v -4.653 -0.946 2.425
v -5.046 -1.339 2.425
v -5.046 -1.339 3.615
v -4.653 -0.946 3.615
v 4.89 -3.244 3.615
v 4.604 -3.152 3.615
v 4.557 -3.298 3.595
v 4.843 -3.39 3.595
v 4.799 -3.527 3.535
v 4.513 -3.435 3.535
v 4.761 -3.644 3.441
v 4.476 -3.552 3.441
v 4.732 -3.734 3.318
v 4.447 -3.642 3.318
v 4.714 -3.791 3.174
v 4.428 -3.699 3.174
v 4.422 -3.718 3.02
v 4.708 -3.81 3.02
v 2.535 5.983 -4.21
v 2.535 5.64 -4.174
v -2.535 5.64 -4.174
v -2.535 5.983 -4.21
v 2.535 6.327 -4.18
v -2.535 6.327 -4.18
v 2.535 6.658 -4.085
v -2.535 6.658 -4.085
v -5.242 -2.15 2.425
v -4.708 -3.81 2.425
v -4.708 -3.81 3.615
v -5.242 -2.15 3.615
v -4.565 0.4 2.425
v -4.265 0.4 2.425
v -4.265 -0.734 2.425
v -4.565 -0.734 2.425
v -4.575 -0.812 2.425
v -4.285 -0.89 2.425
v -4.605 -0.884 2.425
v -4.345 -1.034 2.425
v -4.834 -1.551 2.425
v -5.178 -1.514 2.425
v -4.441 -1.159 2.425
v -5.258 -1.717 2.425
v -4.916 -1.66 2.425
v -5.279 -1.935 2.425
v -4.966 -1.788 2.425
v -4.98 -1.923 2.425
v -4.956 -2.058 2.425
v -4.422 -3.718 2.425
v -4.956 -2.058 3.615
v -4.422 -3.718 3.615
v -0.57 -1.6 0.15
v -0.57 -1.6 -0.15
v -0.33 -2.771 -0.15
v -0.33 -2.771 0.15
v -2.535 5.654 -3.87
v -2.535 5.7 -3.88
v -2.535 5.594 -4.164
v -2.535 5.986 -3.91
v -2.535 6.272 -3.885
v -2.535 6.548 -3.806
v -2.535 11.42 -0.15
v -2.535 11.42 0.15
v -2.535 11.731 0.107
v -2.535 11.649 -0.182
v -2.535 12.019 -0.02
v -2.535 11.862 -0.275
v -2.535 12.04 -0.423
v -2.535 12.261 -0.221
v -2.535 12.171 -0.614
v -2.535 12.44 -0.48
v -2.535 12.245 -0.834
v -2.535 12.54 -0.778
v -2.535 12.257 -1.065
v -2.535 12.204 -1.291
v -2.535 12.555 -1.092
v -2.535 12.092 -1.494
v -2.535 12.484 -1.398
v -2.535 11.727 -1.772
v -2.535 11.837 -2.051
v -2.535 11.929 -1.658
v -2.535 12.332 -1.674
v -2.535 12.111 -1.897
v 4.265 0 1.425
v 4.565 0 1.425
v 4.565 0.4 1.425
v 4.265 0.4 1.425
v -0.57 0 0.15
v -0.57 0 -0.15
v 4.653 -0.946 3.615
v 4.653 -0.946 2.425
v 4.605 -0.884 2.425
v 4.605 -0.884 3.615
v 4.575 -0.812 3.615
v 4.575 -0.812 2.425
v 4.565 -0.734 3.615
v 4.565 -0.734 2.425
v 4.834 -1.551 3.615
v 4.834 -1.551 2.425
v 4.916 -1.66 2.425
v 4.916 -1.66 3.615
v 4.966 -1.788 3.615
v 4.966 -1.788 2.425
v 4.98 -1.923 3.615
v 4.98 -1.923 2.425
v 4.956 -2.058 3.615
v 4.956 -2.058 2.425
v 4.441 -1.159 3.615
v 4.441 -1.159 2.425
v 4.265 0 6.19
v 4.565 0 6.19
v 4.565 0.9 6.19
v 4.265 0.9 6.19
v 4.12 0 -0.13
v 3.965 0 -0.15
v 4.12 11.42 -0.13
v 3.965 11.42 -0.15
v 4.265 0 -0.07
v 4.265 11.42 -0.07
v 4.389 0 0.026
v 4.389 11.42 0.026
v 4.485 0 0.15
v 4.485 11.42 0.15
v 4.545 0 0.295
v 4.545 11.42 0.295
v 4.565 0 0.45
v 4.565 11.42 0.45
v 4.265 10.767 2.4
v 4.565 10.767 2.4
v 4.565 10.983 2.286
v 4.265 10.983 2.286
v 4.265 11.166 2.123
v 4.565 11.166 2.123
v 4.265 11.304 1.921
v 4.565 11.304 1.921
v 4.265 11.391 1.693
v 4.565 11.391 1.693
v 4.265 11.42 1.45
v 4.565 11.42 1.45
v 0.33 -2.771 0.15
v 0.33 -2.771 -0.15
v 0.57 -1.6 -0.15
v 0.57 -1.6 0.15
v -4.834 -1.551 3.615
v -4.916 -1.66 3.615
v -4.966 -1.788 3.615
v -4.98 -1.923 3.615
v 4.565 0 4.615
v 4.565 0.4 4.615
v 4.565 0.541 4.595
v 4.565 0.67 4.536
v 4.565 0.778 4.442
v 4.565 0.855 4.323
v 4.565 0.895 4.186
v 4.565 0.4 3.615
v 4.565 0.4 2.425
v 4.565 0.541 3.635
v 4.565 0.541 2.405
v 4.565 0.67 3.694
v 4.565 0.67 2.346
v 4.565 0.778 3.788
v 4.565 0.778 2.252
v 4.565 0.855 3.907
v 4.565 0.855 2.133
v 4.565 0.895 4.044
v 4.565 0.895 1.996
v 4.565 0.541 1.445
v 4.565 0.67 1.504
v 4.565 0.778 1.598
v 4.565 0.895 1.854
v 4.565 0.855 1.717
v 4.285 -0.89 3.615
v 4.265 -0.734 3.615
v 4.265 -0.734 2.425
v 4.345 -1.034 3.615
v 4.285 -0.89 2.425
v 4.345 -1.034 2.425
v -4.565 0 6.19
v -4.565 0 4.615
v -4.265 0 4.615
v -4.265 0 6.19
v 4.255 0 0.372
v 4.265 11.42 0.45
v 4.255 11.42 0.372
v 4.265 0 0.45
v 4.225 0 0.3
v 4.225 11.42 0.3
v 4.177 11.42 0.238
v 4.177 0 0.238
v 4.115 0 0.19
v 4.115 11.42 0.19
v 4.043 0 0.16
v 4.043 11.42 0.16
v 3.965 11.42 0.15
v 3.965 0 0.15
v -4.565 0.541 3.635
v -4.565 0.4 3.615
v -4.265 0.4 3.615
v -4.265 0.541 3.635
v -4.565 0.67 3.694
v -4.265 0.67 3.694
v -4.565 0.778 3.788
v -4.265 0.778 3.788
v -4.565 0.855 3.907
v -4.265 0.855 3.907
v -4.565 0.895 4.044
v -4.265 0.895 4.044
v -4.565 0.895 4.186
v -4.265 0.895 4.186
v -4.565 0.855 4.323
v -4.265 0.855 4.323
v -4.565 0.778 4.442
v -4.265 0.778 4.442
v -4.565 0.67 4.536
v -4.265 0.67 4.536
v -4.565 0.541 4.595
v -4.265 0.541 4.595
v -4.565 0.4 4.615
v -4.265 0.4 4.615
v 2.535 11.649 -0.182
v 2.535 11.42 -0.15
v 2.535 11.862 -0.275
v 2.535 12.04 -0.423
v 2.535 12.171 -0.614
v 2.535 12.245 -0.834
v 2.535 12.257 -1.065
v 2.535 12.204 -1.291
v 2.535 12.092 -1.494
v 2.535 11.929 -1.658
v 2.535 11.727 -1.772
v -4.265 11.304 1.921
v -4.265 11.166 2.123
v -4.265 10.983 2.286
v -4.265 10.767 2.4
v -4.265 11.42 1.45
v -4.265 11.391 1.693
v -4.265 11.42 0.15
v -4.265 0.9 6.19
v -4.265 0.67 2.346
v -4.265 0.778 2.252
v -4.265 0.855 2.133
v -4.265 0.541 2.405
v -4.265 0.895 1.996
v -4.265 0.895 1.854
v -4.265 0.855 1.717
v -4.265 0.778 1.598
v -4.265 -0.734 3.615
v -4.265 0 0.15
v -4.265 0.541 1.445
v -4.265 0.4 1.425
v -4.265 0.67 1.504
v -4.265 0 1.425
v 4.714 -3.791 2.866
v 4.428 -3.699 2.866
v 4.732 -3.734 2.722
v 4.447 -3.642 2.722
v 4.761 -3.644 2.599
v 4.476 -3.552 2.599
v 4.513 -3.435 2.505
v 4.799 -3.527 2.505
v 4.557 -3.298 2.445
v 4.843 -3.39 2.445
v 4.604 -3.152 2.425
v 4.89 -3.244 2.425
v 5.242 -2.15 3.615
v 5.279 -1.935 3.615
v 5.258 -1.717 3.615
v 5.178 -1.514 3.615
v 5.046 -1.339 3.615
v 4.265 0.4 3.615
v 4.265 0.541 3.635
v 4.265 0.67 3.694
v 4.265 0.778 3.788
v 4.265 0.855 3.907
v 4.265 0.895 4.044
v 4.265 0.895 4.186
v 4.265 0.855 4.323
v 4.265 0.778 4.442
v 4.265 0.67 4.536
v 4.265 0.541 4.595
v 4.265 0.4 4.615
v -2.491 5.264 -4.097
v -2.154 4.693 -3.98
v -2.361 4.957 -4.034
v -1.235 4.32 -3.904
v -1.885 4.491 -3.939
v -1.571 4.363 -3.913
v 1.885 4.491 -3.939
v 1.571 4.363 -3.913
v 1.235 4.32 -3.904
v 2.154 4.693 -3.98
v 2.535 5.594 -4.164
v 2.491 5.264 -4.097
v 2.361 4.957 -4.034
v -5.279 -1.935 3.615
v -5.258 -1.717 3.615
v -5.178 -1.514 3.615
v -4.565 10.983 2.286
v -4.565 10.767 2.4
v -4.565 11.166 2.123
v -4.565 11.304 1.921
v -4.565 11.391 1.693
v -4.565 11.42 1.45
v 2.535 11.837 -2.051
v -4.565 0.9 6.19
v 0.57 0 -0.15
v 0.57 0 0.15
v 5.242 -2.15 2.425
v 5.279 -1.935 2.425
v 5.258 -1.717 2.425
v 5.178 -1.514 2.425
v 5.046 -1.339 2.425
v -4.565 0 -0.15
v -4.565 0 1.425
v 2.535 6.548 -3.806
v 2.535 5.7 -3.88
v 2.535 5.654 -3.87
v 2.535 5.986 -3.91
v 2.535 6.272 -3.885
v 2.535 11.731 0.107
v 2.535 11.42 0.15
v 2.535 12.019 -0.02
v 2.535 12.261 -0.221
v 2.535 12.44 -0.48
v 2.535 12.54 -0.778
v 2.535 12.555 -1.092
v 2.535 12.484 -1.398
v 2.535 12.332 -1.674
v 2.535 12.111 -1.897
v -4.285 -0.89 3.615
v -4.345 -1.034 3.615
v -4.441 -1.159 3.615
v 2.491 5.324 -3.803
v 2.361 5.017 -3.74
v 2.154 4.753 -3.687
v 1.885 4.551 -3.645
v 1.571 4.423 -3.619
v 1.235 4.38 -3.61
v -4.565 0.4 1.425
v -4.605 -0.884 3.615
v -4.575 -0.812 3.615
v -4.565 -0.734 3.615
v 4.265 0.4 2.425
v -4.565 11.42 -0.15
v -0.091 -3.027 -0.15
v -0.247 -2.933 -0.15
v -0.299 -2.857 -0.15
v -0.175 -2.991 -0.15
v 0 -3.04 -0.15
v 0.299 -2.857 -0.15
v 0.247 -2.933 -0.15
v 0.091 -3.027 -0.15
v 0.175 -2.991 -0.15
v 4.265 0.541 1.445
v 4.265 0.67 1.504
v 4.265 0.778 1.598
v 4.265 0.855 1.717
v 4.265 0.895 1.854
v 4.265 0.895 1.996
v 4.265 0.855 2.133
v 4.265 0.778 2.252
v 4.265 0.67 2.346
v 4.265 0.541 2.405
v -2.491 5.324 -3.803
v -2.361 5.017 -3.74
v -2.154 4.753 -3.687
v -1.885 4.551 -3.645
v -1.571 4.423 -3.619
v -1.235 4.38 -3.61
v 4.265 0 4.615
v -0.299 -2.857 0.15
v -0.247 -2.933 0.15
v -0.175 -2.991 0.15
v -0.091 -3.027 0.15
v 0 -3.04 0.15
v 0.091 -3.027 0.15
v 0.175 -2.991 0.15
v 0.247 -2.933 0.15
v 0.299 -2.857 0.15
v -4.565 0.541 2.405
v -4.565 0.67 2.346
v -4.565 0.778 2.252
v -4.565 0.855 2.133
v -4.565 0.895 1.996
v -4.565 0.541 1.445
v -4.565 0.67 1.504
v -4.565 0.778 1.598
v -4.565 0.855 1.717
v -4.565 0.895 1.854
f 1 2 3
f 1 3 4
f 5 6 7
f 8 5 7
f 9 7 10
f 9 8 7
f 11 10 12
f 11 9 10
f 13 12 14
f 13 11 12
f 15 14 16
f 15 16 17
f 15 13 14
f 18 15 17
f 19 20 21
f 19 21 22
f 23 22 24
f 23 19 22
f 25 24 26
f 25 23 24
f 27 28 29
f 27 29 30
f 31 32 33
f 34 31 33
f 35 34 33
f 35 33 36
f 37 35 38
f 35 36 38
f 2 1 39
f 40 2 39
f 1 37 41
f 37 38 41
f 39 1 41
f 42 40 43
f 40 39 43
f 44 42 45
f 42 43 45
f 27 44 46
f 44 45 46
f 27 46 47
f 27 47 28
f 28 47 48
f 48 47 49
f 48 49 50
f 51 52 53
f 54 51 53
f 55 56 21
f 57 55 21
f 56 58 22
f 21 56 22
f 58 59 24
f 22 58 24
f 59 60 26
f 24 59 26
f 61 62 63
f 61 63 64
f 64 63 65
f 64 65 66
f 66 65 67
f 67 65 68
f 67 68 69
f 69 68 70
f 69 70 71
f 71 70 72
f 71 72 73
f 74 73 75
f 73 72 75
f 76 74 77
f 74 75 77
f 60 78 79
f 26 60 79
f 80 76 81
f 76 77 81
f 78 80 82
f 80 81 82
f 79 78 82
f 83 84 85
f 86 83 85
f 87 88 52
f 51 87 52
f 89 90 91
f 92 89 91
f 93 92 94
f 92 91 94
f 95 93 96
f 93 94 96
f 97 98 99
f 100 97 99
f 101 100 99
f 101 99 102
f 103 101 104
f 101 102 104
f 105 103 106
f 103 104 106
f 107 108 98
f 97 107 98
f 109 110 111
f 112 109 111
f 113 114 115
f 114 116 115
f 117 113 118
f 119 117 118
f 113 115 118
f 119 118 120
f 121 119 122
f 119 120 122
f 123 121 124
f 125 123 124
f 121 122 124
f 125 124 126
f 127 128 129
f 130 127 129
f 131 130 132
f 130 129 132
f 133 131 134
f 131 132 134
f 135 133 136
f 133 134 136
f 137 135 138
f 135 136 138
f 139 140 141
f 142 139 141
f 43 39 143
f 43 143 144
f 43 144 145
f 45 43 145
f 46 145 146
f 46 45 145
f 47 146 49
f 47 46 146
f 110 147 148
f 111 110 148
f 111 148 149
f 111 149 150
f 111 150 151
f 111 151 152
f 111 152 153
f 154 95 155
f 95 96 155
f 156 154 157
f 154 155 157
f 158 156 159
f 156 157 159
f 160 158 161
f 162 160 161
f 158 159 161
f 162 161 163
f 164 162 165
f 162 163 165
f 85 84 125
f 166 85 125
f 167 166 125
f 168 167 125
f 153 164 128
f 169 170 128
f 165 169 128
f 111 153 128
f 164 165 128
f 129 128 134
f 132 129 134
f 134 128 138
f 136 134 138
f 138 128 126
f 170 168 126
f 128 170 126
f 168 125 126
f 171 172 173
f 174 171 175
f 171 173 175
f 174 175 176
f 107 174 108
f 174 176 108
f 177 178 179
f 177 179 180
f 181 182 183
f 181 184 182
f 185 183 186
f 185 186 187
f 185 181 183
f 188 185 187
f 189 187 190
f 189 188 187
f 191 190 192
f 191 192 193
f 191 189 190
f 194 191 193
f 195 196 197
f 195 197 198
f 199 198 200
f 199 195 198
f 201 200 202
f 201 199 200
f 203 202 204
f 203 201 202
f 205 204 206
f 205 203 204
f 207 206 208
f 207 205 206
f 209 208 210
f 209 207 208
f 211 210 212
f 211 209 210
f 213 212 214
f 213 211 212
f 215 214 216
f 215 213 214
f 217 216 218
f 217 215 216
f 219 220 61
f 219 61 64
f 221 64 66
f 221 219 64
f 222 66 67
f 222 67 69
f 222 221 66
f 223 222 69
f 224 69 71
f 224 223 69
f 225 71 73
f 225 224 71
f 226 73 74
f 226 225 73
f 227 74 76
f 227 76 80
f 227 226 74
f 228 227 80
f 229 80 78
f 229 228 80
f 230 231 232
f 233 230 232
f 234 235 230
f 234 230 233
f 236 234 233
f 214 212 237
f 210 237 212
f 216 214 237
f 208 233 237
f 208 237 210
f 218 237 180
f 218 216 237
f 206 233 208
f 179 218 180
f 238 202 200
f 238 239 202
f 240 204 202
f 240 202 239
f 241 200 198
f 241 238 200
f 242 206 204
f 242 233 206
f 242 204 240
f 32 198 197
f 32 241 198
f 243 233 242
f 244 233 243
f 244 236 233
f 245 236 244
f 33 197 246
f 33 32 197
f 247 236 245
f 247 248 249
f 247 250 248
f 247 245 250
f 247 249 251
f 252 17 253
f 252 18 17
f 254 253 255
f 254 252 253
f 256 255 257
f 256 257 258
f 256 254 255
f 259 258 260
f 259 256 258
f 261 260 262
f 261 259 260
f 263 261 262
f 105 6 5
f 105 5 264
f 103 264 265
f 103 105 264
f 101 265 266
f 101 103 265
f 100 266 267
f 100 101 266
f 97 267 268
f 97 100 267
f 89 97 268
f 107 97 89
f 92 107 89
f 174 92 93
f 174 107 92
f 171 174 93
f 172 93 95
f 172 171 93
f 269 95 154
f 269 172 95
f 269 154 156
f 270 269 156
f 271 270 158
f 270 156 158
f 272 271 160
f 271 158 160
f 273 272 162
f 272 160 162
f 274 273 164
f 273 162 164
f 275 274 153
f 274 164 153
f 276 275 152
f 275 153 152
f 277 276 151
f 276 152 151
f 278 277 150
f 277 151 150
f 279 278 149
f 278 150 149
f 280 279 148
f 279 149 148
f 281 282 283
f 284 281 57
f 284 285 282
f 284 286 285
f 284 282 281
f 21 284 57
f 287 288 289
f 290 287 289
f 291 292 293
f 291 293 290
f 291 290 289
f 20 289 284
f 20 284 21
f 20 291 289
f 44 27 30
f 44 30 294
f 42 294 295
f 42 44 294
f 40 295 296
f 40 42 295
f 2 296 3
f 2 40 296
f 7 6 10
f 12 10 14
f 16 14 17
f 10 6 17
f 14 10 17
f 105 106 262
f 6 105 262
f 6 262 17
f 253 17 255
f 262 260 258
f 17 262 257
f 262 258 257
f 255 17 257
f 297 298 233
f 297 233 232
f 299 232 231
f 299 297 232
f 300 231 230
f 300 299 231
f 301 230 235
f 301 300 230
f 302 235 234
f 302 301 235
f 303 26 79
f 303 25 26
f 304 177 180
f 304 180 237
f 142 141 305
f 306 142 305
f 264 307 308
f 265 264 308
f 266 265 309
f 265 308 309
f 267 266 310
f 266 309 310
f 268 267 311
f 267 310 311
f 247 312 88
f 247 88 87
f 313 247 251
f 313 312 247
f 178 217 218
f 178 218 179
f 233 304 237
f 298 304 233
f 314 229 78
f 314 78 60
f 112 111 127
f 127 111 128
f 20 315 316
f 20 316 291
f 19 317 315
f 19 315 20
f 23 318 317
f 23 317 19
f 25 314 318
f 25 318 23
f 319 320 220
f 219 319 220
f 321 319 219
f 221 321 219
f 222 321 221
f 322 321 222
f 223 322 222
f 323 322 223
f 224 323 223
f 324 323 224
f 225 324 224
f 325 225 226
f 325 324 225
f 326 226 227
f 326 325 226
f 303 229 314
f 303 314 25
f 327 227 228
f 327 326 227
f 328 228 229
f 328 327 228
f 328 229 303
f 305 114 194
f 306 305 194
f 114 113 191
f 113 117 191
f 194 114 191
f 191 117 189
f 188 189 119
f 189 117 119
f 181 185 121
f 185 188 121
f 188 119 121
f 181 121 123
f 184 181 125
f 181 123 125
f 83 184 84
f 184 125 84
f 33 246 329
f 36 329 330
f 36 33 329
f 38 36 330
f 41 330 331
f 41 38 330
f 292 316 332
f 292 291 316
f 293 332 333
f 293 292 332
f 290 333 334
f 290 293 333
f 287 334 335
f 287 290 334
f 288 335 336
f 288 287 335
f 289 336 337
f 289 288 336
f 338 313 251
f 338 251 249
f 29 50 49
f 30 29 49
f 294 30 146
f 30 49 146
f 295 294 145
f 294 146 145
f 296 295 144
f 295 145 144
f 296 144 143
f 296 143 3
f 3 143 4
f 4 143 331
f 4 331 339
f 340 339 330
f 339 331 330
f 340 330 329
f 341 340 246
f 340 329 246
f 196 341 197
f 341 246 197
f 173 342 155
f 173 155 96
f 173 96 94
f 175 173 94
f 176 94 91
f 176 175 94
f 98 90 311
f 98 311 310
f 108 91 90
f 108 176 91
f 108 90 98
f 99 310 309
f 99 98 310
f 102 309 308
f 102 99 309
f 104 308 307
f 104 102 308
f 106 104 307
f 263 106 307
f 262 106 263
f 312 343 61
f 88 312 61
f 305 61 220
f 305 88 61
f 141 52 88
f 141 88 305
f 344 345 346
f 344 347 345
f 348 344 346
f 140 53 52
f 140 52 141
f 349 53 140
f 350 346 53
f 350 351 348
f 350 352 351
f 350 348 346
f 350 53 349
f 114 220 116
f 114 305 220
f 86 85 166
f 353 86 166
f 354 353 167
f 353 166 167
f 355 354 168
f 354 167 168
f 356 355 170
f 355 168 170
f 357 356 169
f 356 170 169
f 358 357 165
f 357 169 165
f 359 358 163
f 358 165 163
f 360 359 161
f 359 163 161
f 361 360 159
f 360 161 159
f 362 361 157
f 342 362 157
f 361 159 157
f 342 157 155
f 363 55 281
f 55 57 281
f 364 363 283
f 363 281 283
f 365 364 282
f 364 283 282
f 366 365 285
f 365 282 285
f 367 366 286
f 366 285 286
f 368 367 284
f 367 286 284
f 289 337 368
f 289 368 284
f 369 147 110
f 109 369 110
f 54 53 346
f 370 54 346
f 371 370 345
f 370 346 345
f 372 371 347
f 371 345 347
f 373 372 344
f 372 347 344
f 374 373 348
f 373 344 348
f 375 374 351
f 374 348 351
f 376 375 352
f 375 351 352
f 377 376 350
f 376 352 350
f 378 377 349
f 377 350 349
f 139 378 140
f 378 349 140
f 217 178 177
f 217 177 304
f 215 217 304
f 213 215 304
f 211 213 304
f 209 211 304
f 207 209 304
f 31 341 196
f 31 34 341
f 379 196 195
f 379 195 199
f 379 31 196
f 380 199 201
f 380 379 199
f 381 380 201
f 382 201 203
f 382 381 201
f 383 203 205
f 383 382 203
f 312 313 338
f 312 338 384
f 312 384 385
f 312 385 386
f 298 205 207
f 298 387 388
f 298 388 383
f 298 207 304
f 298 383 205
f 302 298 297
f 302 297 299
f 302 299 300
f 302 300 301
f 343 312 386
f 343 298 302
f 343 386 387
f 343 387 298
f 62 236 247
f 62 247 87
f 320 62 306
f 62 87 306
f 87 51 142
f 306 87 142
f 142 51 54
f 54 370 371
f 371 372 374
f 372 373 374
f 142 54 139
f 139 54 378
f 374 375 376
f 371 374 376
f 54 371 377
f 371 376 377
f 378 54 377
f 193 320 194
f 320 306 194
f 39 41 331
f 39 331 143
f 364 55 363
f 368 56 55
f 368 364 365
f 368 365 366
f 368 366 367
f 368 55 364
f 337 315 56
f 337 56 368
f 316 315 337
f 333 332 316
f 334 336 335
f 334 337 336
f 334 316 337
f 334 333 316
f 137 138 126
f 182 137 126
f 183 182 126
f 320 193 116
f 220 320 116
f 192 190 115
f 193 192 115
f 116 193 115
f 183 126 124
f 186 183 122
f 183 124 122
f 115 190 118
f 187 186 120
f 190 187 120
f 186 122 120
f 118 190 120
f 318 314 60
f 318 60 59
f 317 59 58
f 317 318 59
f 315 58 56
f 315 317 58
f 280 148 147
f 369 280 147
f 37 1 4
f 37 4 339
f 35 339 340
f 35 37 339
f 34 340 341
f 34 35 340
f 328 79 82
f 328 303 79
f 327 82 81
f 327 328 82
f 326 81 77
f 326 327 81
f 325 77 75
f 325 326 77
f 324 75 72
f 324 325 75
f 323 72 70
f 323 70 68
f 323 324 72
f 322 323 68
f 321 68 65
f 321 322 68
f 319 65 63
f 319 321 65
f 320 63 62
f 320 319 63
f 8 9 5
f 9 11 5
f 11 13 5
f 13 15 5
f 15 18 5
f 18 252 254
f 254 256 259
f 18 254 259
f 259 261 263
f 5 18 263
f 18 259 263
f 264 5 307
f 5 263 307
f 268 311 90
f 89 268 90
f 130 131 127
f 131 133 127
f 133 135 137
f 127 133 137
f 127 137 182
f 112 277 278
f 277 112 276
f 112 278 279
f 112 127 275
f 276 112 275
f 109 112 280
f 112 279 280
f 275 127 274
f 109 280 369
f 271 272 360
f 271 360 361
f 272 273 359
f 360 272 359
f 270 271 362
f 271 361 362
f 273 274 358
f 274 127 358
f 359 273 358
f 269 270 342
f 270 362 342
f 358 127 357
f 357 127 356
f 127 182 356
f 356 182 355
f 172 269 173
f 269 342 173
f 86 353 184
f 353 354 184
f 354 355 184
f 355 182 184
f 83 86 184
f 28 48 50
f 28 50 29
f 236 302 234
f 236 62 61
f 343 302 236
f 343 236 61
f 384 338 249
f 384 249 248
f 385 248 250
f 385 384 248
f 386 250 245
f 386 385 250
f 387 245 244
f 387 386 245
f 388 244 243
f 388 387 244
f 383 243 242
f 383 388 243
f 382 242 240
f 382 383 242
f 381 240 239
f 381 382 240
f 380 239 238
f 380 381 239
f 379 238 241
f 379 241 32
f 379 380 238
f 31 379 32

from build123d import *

# Parameters (mm, degrees)
SKETCH1_W                       = 9.13
SKETCH1_H                       = 0.3
BOSS_EXTRUDE1_DEPTH             = 11.42
BOSS_EXTRUDE2_DEPTH             = 2.535
FILLET1_R                       = 1.3
BOSS_EXTRUDE3_DEPTH             = 0.3
BOSS_EXTRUDE4_DEPTH             = 0.3
FILLET2_R                       = 0.3
FILLET3_R                       = 0.6
BOSS_EXTRUDE5_REACH             = 17.194
BOSS_EXTRUDE5_DIRECTION_2_REACH = 17.194
FILLET4_R                       = 0.595


with BuildPart() as part:
    # Sketch1 → Boss-Extrude1 (new body)
    with BuildSketch(Plane(origin=(0, 0, 0), x_dir=(1, 0, 0), z_dir=(0, 1, 0))):
        Rectangle(SKETCH1_W, SKETCH1_H)
    extrude(amount=BOSS_EXTRUDE1_DEPTH)

    # Sketch2 → Boss-Extrude2 (add, symmetric)
    with BuildSketch(Plane(origin=(0, 0, 0), x_dir=(0, 0, -1), z_dir=(1, 0, 0))):
        with BuildLine():
            Line((-0.15, 11.42), (0.15, 11.42))
            ThreePointArc((0.15, 11.42), (0.83370873, 12.245332078), (1.771840569, 11.727124282))
            Line((1.771840569, 11.727124282), (3.806143873, 6.548436218))
            ThreePointArc((3.806143873, 6.548436218), (3.904386052, 6.129654649), (3.879736877, 5.700210886))
            Line((3.879736877, 5.700210886), (3.610438676, 4.379957823))
            Line((3.610438676, 4.379957823), (3.904386052, 4.32))
            Line((3.904386052, 4.32), (4.173684252, 5.640253063))
            ThreePointArc((4.173684252, 5.640253063), (4.203263262, 6.155585579), (4.085372648, 6.658123461))
            Line((4.085372648, 6.658123461), (2.051069344, 11.836811525))
            ThreePointArc((2.051069344, 11.836811525), (0.77789042, 12.540093534), (-0.15, 11.42))
        make_face()
    extrude(amount=BOSS_EXTRUDE2_DEPTH, both=True)

    # Fillet1
    fillet1_edges = [part.edges().sort_by_distance(p)[0] for p in [
        (-2.535, 4.349978911, -3.757412364),
        (2.535, 4.349978911, -3.757412364),
    ]]
    fillet(fillet1_edges, radius=FILLET1_R)

    # Sketch3 → Boss-Extrude3 (add)
    with BuildSketch(Plane(origin=(0, 0, -0.15), x_dir=(-1, 0, 0), z_dir=(0, 0, -1))):
        with BuildLine():
            Line((-0.57, 0), (0.57, 0))
            Line((0.57, 0), (0.57, -1.6))
            Line((0.57, -1.6), (0.33, -2.770784784))
            ThreePointArc((0.33, -2.770784784), (0, -3.04), (-0.33, -2.770784784))
            Line((-0.33, -2.770784784), (-0.57, -1.6))
            Line((-0.57, -1.6), (-0.57, 0))
        make_face()
    extrude(amount=-BOSS_EXTRUDE3_DEPTH)

    # Sketch4 → Boss-Extrude4 (add)
    with BuildSketch(Plane(origin=(4.565, 0, 0), x_dir=(0, 0, -1), z_dir=(1, 0, 0))):
        with BuildLine():
            Line((-0.15, 11.42), (-0.15, 0))
            Line((-0.15, 0), (-1.425, 0))
            Line((-1.425, 0), (-1.425, 0.4))
            ThreePointArc((-1.425, 0.4), (-1.925, 0.9), (-2.425, 0.4))
            Line((-2.425, 0.4), (-2.425, 0))
            Line((-2.425, 0), (-3.615, 0))
            Line((-3.615, 0), (-3.615, 0.4))
            ThreePointArc((-3.615, 0.4), (-4.115, 0.9), (-4.615, 0.4))
            Line((-4.615, 0.4), (-4.615, 0))
            Line((-4.615, 0), (-6.19, 0))
            Line((-6.19, 0), (-6.19, 0.9))
            Line((-6.19, 0.9), (-2.4, 10.767226789))
            ThreePointArc((-2.4, 10.767226789), (-2.026327352, 11.241078061), (-1.45, 11.42))
            Line((-1.45, 11.42), (-0.15, 11.42))
        make_face()
    boss_extrude4 = extrude(amount=-BOSS_EXTRUDE4_DEPTH)

    # Fillet2
    fillet2_edges = [part.edges().sort_by_distance(p)[0] for p in [
        (4.265, 5.71, 0.15),
    ]]
    fillet(fillet2_edges, radius=FILLET2_R)

    # Fillet3
    fillet3_edges = [part.edges().sort_by_distance(p)[0] for p in [
        (4.565, 5.71, -0.15),
    ]]
    fillet(fillet3_edges, radius=FILLET3_R)

    # Boss-Extrude5: up to this face of the body (flat: up to its plane)
    boss_extrude5_end = Plane(part.part.faces().sort_by_distance((4.415, 0.2, 2.425))[0])
    # Sketch5 → Boss-Extrude5 (add, up to the picked face)
    with BuildSketch(Plane(origin=(0, 0, 3.02), x_dir=(-1, 0, 0), z_dir=(0, 0, -1)), mode=Mode.PRIVATE) as boss_extrude5_sk1:
        with BuildLine():
            Line((-4.565, 0), (-4.265, 0))
            Line((-4.265, 0), (-4.265, -0.734365081))
            ThreePointArc((-4.265, -0.734365081), (-4.31067228, -0.963975141), (-4.440735931, -1.15862915))
            Line((-4.440735931, -1.15862915), (-4.833553391, -1.551446609))
            ThreePointArc((-4.833553391, -1.551446609), (-4.966005966, -1.787534255), (-4.95599841, -2.058053958))
            Line((-4.95599841, -2.058053958), (-4.422200477, -3.718167625))
            Line((-4.422200477, -3.718167625), (-4.707799523, -3.81))
            Line((-4.707799523, -3.81), (-5.241597456, -2.149886332))
            ThreePointArc((-5.241597456, -2.149886332), (-5.257609545, -1.717054807), (-5.045685425, -1.339314575))
            Line((-5.045685425, -1.339314575), (-4.652867966, -0.946497116))
            ThreePointArc((-4.652867966, -0.946497116), (-4.58783614, -0.849170111), (-4.565, -0.734365081))
            Line((-4.565, -0.734365081), (-4.565, 0))
        make_face()
    boss_extrude5_tool1 = split(extrude(boss_extrude5_sk1.sketch, amount=BOSS_EXTRUDE5_REACH, mode=Mode.PRIVATE), bisect_by=boss_extrude5_end, keep=Keep.BOTH, mode=Mode.PRIVATE)
    boss_extrude5 = boss_extrude5_tool1.solids().sort_by(Axis((4.415, -0.039429, 3.02), (0, 0, -1)))[0]
    add(boss_extrude5)

    # Boss-Extrude5 direction 2: up to this face of the body (flat: up to its plane)
    boss_extrude5_direction_2_end = Plane(part.part.faces().sort_by_distance((4.415, 0.2, 3.615))[0])
    # Sketch5 → Boss-Extrude5 direction 2 (add, up to the picked face)
    with BuildSketch(Plane(origin=(0, 0, 3.02), x_dir=(-1, 0, 0), z_dir=(0, 0, -1)), mode=Mode.PRIVATE) as boss_extrude5_direction_2_sk1:
        with BuildLine():
            Line((-4.565, 0), (-4.265, 0))
            Line((-4.265, 0), (-4.265, -0.734365081))
            ThreePointArc((-4.265, -0.734365081), (-4.31067228, -0.963975141), (-4.440735931, -1.15862915))
            Line((-4.440735931, -1.15862915), (-4.833553391, -1.551446609))
            ThreePointArc((-4.833553391, -1.551446609), (-4.966005966, -1.787534255), (-4.95599841, -2.058053958))
            Line((-4.95599841, -2.058053958), (-4.422200477, -3.718167625))
            Line((-4.422200477, -3.718167625), (-4.707799523, -3.81))
            Line((-4.707799523, -3.81), (-5.241597456, -2.149886332))
            ThreePointArc((-5.241597456, -2.149886332), (-5.257609545, -1.717054807), (-5.045685425, -1.339314575))
            Line((-5.045685425, -1.339314575), (-4.652867966, -0.946497116))
            ThreePointArc((-4.652867966, -0.946497116), (-4.58783614, -0.849170111), (-4.565, -0.734365081))
            Line((-4.565, -0.734365081), (-4.565, 0))
        make_face()
    boss_extrude5_direction_2_tool1 = split(extrude(boss_extrude5_direction_2_sk1.sketch, amount=-BOSS_EXTRUDE5_DIRECTION_2_REACH, mode=Mode.PRIVATE), bisect_by=boss_extrude5_direction_2_end, keep=Keep.BOTH, mode=Mode.PRIVATE)
    boss_extrude5_direction_2 = boss_extrude5_direction_2_tool1.solids().sort_by(Axis((4.415, -0.039429, 3.02), (0, 0, 1)))[0]
    add(boss_extrude5_direction_2)

    # Fillet4
    fillet4_edges = [part.edges().sort_by_distance(p)[0] for p in [
        (4.565, -3.764083813, 2.425),
        (4.565, -3.764083813, 3.615),
    ]]
    fillet(fillet4_edges, radius=FILLET4_R - 0.0001)  # a hair under: the kernel refuses the full size

    # Mirror1: Boss-Extrude4, Boss-Extrude5, Boss-Extrude5 direction 2 across plane
    add(boss_extrude4.mirror(Plane(origin=(0, 0, 0), x_dir=(0, 0, 1), z_dir=(1, 0, 0))))
    add(boss_extrude5.mirror(Plane(origin=(0, 0, 0), x_dir=(0, 0, 1), z_dir=(1, 0, 0))))
    add(boss_extrude5_direction_2.mirror(Plane(origin=(0, 0, 0), x_dir=(0, 0, 1), z_dir=(1, 0, 0))))


solid = part.part
